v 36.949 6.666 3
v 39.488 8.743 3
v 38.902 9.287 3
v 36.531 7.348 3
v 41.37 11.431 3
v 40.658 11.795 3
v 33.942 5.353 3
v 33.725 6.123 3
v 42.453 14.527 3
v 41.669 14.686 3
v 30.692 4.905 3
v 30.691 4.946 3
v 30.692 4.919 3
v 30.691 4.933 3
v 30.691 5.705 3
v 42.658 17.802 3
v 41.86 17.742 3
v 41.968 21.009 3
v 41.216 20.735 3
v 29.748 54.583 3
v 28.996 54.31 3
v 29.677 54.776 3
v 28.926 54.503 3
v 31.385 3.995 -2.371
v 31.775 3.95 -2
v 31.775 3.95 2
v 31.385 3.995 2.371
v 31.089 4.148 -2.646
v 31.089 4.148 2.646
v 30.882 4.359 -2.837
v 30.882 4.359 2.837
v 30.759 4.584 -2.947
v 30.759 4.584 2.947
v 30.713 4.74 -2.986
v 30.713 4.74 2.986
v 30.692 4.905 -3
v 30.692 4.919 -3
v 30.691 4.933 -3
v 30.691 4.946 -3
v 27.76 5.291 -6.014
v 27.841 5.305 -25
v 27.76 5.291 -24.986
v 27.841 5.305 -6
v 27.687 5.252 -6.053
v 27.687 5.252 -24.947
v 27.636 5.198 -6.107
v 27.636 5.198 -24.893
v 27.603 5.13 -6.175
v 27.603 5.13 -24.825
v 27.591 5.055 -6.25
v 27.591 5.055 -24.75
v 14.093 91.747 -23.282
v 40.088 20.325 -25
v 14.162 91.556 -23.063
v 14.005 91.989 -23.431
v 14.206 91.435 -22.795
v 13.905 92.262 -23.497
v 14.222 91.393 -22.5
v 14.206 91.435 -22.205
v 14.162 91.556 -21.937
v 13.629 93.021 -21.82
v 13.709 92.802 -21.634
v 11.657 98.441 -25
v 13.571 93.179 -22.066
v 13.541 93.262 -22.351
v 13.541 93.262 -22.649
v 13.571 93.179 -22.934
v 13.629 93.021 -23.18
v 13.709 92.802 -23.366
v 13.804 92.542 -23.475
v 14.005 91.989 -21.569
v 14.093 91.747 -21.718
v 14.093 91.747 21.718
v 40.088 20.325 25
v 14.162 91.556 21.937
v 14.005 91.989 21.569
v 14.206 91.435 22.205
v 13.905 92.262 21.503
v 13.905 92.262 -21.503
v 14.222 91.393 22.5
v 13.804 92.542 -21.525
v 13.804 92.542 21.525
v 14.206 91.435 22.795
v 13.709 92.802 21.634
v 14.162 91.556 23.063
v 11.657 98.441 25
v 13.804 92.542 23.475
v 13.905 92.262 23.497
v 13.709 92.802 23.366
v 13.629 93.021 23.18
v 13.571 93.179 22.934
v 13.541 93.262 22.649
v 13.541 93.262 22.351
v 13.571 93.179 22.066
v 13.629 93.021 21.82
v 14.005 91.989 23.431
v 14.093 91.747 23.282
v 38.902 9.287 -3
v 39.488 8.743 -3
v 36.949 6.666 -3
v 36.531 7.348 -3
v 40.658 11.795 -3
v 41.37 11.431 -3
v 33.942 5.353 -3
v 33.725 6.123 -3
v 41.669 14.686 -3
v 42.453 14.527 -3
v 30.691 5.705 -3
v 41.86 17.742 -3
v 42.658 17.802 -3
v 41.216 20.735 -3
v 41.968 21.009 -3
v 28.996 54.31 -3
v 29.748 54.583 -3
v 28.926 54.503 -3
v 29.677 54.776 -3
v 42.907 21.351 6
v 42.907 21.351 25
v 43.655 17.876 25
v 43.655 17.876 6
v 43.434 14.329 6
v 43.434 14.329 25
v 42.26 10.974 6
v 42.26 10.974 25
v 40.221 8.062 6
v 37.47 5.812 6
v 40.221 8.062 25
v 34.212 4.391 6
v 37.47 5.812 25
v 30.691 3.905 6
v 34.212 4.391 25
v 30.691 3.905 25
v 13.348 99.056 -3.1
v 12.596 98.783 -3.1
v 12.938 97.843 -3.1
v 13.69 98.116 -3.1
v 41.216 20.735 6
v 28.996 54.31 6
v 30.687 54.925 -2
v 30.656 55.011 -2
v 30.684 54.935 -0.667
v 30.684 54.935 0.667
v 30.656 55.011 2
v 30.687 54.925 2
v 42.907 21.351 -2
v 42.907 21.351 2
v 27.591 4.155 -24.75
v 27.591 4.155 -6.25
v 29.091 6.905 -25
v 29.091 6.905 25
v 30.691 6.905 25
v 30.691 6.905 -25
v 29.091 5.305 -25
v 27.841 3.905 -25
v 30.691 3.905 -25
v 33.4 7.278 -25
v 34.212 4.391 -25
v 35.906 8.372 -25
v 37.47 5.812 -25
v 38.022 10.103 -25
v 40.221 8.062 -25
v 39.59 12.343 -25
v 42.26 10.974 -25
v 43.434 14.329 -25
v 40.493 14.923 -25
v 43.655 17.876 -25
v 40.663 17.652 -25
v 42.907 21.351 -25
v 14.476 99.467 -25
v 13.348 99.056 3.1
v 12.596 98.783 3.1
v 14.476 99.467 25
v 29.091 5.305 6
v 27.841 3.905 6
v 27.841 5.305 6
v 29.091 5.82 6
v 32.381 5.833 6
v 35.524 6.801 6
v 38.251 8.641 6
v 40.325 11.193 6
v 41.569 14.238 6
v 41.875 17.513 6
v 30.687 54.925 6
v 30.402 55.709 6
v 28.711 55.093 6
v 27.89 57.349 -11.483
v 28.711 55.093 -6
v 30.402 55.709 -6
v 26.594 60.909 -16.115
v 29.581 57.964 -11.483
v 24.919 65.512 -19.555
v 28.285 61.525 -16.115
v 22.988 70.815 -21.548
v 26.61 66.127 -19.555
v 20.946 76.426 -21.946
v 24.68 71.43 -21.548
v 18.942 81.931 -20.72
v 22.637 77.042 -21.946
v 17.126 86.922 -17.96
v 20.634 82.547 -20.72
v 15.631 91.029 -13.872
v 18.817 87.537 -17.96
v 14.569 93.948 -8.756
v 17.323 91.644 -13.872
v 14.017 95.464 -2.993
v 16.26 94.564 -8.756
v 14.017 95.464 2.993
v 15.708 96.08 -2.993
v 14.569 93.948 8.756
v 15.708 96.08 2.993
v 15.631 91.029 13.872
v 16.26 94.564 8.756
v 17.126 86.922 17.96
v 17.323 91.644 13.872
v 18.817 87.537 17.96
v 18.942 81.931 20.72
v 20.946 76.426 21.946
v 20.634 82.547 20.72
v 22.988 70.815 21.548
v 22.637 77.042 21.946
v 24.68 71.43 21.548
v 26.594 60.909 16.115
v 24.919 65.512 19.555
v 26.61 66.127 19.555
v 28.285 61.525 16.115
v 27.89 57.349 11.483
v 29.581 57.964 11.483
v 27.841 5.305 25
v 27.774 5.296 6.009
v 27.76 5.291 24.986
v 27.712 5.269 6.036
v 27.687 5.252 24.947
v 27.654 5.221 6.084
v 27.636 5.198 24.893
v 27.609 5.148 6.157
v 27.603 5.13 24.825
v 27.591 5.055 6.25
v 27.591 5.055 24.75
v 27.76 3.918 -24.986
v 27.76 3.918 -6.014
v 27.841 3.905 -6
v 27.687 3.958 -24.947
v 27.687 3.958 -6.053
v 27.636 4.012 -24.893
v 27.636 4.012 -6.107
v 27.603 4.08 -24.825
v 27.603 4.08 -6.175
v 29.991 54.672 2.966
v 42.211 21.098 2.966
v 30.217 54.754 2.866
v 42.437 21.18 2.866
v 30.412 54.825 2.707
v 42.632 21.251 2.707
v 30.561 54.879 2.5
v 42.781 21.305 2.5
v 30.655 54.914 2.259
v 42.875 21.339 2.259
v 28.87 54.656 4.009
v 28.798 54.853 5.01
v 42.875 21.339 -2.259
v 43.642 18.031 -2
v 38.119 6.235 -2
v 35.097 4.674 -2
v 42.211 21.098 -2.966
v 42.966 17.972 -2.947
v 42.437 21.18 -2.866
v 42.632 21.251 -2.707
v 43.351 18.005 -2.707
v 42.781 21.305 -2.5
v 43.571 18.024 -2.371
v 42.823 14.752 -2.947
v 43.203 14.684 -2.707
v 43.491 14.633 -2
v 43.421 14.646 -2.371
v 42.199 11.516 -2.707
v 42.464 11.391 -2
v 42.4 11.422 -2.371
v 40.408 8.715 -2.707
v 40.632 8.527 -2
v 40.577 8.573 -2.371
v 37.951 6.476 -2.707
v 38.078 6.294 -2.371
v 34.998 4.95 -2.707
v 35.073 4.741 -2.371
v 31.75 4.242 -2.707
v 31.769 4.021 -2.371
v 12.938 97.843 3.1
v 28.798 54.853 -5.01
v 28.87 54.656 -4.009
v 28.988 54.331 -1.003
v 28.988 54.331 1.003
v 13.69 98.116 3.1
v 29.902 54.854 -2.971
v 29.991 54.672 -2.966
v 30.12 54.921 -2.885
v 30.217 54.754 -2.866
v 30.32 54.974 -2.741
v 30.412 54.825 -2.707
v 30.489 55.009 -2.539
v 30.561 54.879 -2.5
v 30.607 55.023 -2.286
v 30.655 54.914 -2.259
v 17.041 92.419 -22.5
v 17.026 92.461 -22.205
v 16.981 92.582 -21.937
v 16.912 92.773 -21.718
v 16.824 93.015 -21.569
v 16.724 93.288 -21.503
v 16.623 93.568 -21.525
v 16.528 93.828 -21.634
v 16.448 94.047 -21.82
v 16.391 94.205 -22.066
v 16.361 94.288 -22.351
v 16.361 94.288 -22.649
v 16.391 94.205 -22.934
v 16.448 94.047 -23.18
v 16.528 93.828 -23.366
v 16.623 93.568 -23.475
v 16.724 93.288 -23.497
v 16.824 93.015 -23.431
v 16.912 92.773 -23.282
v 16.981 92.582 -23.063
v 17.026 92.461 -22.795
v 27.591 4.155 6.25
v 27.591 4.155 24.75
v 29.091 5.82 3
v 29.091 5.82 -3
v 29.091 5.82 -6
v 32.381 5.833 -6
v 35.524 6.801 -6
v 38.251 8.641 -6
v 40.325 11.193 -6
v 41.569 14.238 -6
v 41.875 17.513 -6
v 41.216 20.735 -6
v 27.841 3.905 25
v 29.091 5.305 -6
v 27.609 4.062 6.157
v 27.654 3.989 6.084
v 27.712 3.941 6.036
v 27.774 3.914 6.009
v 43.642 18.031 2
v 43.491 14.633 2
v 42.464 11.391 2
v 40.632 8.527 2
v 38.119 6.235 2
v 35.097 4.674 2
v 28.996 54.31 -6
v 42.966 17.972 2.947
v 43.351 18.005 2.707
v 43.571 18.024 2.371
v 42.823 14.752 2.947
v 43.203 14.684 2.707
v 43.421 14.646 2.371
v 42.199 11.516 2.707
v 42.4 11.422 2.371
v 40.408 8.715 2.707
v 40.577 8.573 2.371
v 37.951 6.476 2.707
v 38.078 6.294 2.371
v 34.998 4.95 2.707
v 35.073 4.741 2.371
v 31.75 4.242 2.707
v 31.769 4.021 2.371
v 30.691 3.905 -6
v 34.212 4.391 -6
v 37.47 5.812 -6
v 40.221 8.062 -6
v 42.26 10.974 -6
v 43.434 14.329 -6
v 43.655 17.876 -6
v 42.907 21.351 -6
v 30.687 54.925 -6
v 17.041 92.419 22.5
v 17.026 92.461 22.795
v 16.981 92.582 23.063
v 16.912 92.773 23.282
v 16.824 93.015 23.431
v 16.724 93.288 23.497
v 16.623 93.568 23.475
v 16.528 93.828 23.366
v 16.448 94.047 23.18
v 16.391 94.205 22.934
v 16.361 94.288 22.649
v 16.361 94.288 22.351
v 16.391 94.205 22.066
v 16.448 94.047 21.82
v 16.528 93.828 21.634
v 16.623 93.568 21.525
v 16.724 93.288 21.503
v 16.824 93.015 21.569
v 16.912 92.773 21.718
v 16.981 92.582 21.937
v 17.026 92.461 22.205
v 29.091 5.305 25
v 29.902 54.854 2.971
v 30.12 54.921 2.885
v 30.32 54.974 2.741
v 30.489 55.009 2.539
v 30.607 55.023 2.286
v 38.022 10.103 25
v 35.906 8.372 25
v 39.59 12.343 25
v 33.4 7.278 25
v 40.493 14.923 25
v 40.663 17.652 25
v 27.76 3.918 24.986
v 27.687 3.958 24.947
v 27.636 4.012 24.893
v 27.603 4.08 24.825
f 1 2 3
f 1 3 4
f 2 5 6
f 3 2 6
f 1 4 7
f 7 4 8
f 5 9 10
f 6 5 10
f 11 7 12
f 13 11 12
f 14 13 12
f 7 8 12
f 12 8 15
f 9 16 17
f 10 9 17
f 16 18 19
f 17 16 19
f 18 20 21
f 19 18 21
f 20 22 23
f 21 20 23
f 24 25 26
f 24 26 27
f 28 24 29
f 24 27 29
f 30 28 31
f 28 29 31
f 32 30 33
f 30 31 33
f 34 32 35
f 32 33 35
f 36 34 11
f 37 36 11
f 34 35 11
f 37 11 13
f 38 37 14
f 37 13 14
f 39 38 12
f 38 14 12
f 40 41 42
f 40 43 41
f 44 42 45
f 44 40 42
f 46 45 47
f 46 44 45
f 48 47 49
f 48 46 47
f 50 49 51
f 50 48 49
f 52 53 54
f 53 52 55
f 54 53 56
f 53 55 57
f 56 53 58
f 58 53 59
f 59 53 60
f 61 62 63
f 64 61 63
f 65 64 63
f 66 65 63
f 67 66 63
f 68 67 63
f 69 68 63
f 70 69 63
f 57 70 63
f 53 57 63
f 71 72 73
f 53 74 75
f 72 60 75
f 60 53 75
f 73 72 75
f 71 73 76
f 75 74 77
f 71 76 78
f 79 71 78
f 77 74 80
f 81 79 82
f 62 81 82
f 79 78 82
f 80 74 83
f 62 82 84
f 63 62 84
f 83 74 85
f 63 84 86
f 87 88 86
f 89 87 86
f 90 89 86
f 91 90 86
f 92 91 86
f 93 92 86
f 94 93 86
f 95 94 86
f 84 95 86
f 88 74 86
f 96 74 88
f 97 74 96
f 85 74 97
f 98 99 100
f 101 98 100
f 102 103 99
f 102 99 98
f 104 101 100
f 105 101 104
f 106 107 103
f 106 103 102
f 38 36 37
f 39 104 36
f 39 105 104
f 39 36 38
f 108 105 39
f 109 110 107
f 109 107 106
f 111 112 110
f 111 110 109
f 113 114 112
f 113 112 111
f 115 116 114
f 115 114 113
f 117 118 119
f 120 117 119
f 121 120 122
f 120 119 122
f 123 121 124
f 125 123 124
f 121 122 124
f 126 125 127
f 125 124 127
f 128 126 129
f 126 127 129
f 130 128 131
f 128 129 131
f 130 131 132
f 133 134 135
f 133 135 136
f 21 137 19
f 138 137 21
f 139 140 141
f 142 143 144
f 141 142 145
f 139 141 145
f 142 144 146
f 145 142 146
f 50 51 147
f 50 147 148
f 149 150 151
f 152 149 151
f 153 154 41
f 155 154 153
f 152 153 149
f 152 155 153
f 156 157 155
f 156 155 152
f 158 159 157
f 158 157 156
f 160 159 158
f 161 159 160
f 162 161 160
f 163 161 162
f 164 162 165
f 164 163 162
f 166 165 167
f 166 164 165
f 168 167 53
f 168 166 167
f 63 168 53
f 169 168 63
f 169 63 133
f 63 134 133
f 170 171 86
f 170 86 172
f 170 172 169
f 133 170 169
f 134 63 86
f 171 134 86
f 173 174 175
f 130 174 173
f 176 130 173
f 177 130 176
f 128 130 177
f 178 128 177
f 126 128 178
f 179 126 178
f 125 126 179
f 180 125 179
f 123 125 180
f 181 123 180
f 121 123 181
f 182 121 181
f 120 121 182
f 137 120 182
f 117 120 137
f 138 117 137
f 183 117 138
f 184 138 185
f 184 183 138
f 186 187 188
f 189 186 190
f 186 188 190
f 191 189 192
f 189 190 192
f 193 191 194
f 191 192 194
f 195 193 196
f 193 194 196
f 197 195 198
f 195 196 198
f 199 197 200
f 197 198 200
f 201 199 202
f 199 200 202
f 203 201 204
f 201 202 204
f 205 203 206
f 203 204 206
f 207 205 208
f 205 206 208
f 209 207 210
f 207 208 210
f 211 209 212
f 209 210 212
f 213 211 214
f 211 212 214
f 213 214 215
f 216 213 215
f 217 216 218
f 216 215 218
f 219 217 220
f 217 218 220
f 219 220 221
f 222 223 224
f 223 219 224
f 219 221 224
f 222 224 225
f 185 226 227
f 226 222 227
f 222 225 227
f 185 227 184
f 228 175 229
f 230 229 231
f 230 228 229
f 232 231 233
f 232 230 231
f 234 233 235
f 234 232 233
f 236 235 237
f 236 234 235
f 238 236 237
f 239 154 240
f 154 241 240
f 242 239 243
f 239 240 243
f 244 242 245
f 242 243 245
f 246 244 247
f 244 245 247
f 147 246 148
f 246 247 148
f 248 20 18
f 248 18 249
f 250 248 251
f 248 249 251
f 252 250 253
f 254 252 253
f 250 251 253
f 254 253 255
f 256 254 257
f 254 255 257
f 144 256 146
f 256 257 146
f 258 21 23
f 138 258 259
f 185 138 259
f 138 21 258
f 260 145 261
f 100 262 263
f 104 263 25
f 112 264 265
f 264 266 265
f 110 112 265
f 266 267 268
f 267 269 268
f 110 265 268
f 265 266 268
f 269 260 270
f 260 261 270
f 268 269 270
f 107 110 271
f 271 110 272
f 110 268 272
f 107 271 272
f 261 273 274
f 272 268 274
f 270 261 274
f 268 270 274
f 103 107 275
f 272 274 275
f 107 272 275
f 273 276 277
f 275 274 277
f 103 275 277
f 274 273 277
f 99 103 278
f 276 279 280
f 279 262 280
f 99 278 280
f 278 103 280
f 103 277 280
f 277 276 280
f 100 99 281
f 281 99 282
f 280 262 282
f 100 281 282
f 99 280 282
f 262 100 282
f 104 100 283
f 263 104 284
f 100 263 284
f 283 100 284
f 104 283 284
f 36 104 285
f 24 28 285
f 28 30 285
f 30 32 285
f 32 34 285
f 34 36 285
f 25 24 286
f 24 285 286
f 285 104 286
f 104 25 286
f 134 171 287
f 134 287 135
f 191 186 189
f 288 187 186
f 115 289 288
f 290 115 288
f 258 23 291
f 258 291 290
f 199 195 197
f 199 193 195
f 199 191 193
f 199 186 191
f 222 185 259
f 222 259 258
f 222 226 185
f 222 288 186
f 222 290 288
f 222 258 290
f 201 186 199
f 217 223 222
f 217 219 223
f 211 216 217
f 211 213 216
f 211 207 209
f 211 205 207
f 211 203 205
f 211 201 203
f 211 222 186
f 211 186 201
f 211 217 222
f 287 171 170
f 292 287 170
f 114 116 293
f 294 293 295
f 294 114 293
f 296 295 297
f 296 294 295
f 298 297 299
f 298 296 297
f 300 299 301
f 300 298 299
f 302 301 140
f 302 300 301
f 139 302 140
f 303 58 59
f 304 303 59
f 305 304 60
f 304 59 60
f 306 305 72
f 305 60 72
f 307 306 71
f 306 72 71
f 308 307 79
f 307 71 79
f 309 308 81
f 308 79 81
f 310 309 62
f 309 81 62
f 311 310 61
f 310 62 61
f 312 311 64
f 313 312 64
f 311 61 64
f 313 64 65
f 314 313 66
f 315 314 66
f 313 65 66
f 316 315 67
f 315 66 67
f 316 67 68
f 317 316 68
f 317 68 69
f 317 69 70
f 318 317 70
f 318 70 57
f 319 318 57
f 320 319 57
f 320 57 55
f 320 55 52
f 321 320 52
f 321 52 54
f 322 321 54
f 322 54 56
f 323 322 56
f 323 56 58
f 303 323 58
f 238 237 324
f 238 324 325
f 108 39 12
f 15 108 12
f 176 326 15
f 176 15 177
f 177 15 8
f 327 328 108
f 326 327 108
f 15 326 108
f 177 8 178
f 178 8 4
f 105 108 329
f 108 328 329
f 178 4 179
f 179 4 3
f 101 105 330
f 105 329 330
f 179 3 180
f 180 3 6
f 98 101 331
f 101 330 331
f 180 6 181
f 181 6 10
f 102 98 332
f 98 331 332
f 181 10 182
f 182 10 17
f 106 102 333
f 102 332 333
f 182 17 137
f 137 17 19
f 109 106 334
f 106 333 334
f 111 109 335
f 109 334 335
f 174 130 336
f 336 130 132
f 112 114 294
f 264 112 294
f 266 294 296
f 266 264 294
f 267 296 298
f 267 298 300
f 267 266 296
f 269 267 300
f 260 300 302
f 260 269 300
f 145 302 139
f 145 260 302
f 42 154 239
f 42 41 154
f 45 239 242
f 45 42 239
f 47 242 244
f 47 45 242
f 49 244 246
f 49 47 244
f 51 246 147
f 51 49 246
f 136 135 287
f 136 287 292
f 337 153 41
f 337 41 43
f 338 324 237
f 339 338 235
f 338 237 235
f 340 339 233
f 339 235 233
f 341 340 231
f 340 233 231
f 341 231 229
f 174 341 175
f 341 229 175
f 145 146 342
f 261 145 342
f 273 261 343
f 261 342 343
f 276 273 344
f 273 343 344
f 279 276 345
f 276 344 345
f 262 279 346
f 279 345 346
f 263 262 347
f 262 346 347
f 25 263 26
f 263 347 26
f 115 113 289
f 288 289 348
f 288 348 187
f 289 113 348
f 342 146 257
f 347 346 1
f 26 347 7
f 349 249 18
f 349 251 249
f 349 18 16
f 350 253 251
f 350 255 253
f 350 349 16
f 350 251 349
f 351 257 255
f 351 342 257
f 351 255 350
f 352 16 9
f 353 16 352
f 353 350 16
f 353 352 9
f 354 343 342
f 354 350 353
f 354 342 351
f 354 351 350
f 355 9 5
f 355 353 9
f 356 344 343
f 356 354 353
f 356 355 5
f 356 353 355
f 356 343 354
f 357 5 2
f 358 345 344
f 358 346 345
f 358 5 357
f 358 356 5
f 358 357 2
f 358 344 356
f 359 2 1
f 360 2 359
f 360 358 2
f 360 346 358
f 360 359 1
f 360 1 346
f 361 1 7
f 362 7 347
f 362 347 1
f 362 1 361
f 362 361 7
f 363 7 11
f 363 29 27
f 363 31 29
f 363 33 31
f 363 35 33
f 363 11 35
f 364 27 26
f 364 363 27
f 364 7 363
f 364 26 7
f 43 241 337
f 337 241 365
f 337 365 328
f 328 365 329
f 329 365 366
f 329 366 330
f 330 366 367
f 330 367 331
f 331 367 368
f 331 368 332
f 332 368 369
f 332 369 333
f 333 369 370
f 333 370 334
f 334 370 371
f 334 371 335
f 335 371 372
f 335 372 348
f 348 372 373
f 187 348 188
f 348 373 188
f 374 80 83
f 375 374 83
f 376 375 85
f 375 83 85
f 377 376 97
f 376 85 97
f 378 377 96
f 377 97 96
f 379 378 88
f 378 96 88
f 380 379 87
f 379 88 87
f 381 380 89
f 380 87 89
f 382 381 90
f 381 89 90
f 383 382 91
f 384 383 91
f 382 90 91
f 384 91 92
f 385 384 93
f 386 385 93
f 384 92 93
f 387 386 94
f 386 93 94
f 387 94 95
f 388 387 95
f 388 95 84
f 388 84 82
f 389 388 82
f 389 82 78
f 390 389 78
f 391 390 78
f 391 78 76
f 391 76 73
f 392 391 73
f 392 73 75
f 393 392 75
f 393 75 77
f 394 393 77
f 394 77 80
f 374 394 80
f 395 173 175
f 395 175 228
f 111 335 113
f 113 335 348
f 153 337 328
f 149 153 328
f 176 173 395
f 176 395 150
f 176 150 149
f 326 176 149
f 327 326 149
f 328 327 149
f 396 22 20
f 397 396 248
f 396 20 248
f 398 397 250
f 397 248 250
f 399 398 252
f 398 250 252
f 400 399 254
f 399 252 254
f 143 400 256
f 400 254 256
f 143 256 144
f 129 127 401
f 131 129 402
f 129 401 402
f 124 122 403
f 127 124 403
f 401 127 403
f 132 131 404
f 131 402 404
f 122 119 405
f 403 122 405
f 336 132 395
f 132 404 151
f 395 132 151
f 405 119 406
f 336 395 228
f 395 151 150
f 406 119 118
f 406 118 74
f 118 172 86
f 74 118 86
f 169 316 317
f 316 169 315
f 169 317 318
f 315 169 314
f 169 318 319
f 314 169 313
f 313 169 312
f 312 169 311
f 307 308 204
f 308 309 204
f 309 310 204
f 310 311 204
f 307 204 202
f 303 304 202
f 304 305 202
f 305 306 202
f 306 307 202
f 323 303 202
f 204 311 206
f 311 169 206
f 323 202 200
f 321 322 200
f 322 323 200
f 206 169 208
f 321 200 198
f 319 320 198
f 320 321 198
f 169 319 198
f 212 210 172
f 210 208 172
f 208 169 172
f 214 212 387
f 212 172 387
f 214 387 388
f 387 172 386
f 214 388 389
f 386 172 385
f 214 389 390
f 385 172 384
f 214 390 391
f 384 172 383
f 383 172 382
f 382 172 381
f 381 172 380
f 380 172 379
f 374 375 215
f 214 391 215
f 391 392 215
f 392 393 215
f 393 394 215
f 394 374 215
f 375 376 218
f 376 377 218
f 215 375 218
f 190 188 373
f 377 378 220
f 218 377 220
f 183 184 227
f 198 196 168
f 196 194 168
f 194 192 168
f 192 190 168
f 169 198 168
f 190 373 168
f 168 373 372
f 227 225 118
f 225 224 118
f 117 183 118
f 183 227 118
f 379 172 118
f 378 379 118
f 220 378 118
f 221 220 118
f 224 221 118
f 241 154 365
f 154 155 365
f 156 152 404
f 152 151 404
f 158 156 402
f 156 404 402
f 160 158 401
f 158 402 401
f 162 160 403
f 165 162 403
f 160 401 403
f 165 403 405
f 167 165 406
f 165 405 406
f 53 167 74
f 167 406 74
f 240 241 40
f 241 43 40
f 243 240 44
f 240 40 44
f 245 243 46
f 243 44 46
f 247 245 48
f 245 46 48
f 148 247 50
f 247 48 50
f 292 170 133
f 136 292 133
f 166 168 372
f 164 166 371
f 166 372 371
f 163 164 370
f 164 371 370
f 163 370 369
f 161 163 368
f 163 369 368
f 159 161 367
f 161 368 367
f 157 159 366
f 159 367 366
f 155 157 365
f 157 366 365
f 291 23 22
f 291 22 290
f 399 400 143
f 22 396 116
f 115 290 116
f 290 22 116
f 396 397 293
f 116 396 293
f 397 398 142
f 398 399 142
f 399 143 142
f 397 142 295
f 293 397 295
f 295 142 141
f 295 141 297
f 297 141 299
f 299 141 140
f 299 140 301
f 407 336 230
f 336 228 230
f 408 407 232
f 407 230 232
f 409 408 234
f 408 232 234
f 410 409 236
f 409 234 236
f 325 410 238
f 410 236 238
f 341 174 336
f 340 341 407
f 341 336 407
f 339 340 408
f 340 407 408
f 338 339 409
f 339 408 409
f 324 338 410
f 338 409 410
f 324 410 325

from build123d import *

# Parameters (mm, degrees)
EXTRUDE_1_DEPTH            = 25
SKETCH_4_R                 = 22
CUT_EXTRUDE_1_DEPTH        = 1.8
CUT_EXTRUDE_START          = 6
CUT_EXTRUDE_1_2_DEPTH      = 3
SKETCH_11_W                = 19
SKETCH_11_H                = 1.4
EXTRUDE_3_DEPTH            = 1.5
FILLET_1_R                 = 0.25
SKETCH_14_W                = 0.8
SKETCH_14_H                = 6.2
CUT_EXTRUDE_2_DEPTH        = 1
CUT_EXTRUDE_1_3_REACH      = 110.009
CUT_EXTRUDE_1_3_END_RADIUS = 11.2
SKETCH_15_W                = 2.85
SKETCH_15_H                = 12
FILLET_1_2_R               = 1
CUT_EXTRUDE_2_2_REACH      = 94.909
SKETCH_16_R                = 1


with BuildPart() as part:
    # 草图2 → 整体拉伸-薄壁1 (new, symmetric)
    with BuildSketch(Plane.XY):
        with BuildLine():
            Line((29.091335385, 6.904737634), (30.691335385, 6.904737634))
            ThreePointArc((30.691335385, 6.904737634), (38.882855828, 11.16897327), (40.088261593, 20.324939067))
            Line((40.088261593, 20.324939067), (11.65650271, 98.440554593))
            Line((11.65650271, 98.440554593), (14.475580572, 99.466615023))
            Line((14.475580572, 99.466615023), (42.907339455, 21.350999497))
            ThreePointArc((42.907339455, 21.350999497), (41.340311961, 9.448243961), (30.691335385, 3.904737634))
            Line((30.691335385, 3.904737634), (29.091335385, 3.904737634))
            Line((29.091335385, 3.904737634), (29.091335385, 6.904737634))
        make_face()
    extrude(amount=EXTRUDE_1_DEPTH, both=True)

    # 草图4 → Cut-Extrude 1 (cut)
    with BuildSketch(Plane(origin=(44.750213172, 16.287745572, 0), x_dir=(0, 0, -1), z_dir=(0.9396926207859071, 0.3420201433256726, 0))):
        with Locations(Location((0, 63.117104009, 0), (0, 0, 90))):
            Circle(SKETCH_4_R)
    extrude(amount=-CUT_EXTRUDE_1_DEPTH, mode=Mode.SUBTRACT)

    # 草图3 → Cut-Extrude 1 2 (cut)
    with BuildSketch(Plane.XY.offset(CUT_EXTRUDE_START)):
        with BuildLine():
            ThreePointArc((29.091335385, 5.819612465), (39.382240762, 9.840166611), (41.215892738, 20.735363239))
            Line((41.215892738, 20.735363239), (28.995888649, 54.30954854))
            Line((28.995888649, 54.30954854), (27.969828219, 57.128626402))
            Line((27.969828219, 57.128626402), (29.661274936, 57.74426266))
            Line((29.661274936, 57.74426266), (30.687335366, 54.925184798))
            Line((30.687335366, 54.925184798), (42.907339455, 21.350999497))
            ThreePointArc((42.907339455, 21.350999497), (40.778993412, 8.704789126), (28.834192528, 4.038074492))
            Line((28.834192528, 4.038074492), (29.091335385, 5.819612465))
        make_face()
    cut_extrude_1_2 = extrude(amount=-CUT_EXTRUDE_1_2_DEPTH, mode=Mode.SUBTRACT)

    # 镜向1: Cut-Extrude 1 2 across plane
    add(cut_extrude_1_2.mirror(Plane.XY), mode=Mode.SUBTRACT)

    # 草图11 → 底部卡扣凸台-拉伸3 (add)
    with BuildSketch(Plane.ZY.offset(-29.091335385)):
        with Locations((-15.5, 4.604737634)):
            Rectangle(SKETCH_11_W, SKETCH_11_H)
        with Locations((15.5, 4.604737634)):
            Rectangle(SKETCH_11_W, SKETCH_11_H)
    extrude(amount=EXTRUDE_3_DEPTH)

    # Fillet 1
    fillet_1_edges = [part.edges().sort_by_distance(p)[0] for p in [
        (27.591335385, 4.604737634, 6),
        (27.591335385, 3.904737634, 15.5),
        (27.591335385, 4.604737634, 25),
        (27.591335385, 5.304737634, 15.5),
        (27.591335385, 4.604737634, -25),
        (27.591335385, 3.904737634, -15.5),
        (27.591335385, 4.604737634, -6),
        (27.591335385, 5.304737634, -15.5),
    ]]
    fillet(fillet_1_edges, radius=FILLET_1_R)

    # 草图14 → Cut-Extrude 2 (cut)
    with BuildSketch(Plane(origin=(-30.2746326, 83.178869451, 0), x_dir=(0.9396926207859067, 0.3420201433256736, 0), z_dir=(-0.3420201433256736, 0.9396926207859068, 0))):
        with Locations((46.022182172, 0)):
            Rectangle(SKETCH_14_W, SKETCH_14_H)
    extrude(amount=-CUT_EXTRUDE_2_DEPTH, mode=Mode.SUBTRACT)

    # Cut-Extrude 1 3: up to this cylinder (the profile starts outside it)
    cut_extrude_1_3_end = Plane(origin=(30.691335385, 16.904737634, 0), z_dir=(0, 0, 1)) * Cylinder(CUT_EXTRUDE_1_3_END_RADIUS, 243.418, mode=Mode.PRIVATE)
    # 草图15 → Cut-Extrude 1 3 (cut, up to the surface)
    with BuildSketch(Plane.XZ.offset(-3.904737634), mode=Mode.PRIVATE) as cut_extrude_1_3_sk1:
        with Locations((29.266335385, 0)):
            Rectangle(SKETCH_15_W, SKETCH_15_H)
    cut_extrude_1_3_tool1 = extrude(cut_extrude_1_3_sk1.sketch, amount=-CUT_EXTRUDE_1_3_REACH, mode=Mode.PRIVATE) - cut_extrude_1_3_end
    add(cut_extrude_1_3_tool1.solids().sort_by_distance((29.266335, 3.904738, 0))[0], mode=Mode.SUBTRACT)

    # Fillet 1 2
    fillet_1_2_edges = [part.edges().sort_by_distance(p)[0] for p in [
        (30.691335385, 3.904737634, 0),
        (36.762193938, 38.234648046, 3),
        (41.340311961, 9.448243961, 3),
        (41.340311961, 9.448243961, -3),
        (36.762193938, 38.234648046, -3),
    ]]
    fillet(fillet_1_2_edges, radius=FILLET_1_2_R)

    # 草图16 → Cut-Extrude 2 2 (cut, up to next)
    with BuildSketch(Plane(origin=(41.93113531, 15.261685142, 0), x_dir=(0, 0, 1), z_dir=(-0.9396926207859069, -0.3420201433256731, 0)), mode=Mode.PRIVATE) as cut_extrude_2_2_sk1:
        with Locations(Location((-22.5, 82.017104009, 0), (0, 0, 270))):
            Circle(SKETCH_16_R)
    cut_extrude_2_2_tool1 = extrude(cut_extrude_2_2_sk1.sketch, amount=-CUT_EXTRUDE_2_2_REACH, mode=Mode.PRIVATE) & part.part
    # 草图16 → Cut-Extrude 2 2 (cut, up to next)
    with BuildSketch(Plane(origin=(41.93113531, 15.261685142, 0), x_dir=(0, 0, 1), z_dir=(-0.9396926207859069, -0.3420201433256731, 0)), mode=Mode.PRIVATE) as cut_extrude_2_2_sk2:
        with Locations(Location((22.5, 82.017104009, 0), (0, 0, 270))):
            Circle(SKETCH_16_R)
    cut_extrude_2_2_tool2 = extrude(cut_extrude_2_2_sk2.sketch, amount=-CUT_EXTRUDE_2_2_REACH, mode=Mode.PRIVATE) & part.part
    add(cut_extrude_2_2_tool1.solids().sort_by_distance((13.879634, 92.332553, -22.5))[0], mode=Mode.SUBTRACT)
    add(cut_extrude_2_2_tool2.solids().sort_by_distance((13.879634, 92.332553, 22.5))[0], mode=Mode.SUBTRACT)


solid = part.part
